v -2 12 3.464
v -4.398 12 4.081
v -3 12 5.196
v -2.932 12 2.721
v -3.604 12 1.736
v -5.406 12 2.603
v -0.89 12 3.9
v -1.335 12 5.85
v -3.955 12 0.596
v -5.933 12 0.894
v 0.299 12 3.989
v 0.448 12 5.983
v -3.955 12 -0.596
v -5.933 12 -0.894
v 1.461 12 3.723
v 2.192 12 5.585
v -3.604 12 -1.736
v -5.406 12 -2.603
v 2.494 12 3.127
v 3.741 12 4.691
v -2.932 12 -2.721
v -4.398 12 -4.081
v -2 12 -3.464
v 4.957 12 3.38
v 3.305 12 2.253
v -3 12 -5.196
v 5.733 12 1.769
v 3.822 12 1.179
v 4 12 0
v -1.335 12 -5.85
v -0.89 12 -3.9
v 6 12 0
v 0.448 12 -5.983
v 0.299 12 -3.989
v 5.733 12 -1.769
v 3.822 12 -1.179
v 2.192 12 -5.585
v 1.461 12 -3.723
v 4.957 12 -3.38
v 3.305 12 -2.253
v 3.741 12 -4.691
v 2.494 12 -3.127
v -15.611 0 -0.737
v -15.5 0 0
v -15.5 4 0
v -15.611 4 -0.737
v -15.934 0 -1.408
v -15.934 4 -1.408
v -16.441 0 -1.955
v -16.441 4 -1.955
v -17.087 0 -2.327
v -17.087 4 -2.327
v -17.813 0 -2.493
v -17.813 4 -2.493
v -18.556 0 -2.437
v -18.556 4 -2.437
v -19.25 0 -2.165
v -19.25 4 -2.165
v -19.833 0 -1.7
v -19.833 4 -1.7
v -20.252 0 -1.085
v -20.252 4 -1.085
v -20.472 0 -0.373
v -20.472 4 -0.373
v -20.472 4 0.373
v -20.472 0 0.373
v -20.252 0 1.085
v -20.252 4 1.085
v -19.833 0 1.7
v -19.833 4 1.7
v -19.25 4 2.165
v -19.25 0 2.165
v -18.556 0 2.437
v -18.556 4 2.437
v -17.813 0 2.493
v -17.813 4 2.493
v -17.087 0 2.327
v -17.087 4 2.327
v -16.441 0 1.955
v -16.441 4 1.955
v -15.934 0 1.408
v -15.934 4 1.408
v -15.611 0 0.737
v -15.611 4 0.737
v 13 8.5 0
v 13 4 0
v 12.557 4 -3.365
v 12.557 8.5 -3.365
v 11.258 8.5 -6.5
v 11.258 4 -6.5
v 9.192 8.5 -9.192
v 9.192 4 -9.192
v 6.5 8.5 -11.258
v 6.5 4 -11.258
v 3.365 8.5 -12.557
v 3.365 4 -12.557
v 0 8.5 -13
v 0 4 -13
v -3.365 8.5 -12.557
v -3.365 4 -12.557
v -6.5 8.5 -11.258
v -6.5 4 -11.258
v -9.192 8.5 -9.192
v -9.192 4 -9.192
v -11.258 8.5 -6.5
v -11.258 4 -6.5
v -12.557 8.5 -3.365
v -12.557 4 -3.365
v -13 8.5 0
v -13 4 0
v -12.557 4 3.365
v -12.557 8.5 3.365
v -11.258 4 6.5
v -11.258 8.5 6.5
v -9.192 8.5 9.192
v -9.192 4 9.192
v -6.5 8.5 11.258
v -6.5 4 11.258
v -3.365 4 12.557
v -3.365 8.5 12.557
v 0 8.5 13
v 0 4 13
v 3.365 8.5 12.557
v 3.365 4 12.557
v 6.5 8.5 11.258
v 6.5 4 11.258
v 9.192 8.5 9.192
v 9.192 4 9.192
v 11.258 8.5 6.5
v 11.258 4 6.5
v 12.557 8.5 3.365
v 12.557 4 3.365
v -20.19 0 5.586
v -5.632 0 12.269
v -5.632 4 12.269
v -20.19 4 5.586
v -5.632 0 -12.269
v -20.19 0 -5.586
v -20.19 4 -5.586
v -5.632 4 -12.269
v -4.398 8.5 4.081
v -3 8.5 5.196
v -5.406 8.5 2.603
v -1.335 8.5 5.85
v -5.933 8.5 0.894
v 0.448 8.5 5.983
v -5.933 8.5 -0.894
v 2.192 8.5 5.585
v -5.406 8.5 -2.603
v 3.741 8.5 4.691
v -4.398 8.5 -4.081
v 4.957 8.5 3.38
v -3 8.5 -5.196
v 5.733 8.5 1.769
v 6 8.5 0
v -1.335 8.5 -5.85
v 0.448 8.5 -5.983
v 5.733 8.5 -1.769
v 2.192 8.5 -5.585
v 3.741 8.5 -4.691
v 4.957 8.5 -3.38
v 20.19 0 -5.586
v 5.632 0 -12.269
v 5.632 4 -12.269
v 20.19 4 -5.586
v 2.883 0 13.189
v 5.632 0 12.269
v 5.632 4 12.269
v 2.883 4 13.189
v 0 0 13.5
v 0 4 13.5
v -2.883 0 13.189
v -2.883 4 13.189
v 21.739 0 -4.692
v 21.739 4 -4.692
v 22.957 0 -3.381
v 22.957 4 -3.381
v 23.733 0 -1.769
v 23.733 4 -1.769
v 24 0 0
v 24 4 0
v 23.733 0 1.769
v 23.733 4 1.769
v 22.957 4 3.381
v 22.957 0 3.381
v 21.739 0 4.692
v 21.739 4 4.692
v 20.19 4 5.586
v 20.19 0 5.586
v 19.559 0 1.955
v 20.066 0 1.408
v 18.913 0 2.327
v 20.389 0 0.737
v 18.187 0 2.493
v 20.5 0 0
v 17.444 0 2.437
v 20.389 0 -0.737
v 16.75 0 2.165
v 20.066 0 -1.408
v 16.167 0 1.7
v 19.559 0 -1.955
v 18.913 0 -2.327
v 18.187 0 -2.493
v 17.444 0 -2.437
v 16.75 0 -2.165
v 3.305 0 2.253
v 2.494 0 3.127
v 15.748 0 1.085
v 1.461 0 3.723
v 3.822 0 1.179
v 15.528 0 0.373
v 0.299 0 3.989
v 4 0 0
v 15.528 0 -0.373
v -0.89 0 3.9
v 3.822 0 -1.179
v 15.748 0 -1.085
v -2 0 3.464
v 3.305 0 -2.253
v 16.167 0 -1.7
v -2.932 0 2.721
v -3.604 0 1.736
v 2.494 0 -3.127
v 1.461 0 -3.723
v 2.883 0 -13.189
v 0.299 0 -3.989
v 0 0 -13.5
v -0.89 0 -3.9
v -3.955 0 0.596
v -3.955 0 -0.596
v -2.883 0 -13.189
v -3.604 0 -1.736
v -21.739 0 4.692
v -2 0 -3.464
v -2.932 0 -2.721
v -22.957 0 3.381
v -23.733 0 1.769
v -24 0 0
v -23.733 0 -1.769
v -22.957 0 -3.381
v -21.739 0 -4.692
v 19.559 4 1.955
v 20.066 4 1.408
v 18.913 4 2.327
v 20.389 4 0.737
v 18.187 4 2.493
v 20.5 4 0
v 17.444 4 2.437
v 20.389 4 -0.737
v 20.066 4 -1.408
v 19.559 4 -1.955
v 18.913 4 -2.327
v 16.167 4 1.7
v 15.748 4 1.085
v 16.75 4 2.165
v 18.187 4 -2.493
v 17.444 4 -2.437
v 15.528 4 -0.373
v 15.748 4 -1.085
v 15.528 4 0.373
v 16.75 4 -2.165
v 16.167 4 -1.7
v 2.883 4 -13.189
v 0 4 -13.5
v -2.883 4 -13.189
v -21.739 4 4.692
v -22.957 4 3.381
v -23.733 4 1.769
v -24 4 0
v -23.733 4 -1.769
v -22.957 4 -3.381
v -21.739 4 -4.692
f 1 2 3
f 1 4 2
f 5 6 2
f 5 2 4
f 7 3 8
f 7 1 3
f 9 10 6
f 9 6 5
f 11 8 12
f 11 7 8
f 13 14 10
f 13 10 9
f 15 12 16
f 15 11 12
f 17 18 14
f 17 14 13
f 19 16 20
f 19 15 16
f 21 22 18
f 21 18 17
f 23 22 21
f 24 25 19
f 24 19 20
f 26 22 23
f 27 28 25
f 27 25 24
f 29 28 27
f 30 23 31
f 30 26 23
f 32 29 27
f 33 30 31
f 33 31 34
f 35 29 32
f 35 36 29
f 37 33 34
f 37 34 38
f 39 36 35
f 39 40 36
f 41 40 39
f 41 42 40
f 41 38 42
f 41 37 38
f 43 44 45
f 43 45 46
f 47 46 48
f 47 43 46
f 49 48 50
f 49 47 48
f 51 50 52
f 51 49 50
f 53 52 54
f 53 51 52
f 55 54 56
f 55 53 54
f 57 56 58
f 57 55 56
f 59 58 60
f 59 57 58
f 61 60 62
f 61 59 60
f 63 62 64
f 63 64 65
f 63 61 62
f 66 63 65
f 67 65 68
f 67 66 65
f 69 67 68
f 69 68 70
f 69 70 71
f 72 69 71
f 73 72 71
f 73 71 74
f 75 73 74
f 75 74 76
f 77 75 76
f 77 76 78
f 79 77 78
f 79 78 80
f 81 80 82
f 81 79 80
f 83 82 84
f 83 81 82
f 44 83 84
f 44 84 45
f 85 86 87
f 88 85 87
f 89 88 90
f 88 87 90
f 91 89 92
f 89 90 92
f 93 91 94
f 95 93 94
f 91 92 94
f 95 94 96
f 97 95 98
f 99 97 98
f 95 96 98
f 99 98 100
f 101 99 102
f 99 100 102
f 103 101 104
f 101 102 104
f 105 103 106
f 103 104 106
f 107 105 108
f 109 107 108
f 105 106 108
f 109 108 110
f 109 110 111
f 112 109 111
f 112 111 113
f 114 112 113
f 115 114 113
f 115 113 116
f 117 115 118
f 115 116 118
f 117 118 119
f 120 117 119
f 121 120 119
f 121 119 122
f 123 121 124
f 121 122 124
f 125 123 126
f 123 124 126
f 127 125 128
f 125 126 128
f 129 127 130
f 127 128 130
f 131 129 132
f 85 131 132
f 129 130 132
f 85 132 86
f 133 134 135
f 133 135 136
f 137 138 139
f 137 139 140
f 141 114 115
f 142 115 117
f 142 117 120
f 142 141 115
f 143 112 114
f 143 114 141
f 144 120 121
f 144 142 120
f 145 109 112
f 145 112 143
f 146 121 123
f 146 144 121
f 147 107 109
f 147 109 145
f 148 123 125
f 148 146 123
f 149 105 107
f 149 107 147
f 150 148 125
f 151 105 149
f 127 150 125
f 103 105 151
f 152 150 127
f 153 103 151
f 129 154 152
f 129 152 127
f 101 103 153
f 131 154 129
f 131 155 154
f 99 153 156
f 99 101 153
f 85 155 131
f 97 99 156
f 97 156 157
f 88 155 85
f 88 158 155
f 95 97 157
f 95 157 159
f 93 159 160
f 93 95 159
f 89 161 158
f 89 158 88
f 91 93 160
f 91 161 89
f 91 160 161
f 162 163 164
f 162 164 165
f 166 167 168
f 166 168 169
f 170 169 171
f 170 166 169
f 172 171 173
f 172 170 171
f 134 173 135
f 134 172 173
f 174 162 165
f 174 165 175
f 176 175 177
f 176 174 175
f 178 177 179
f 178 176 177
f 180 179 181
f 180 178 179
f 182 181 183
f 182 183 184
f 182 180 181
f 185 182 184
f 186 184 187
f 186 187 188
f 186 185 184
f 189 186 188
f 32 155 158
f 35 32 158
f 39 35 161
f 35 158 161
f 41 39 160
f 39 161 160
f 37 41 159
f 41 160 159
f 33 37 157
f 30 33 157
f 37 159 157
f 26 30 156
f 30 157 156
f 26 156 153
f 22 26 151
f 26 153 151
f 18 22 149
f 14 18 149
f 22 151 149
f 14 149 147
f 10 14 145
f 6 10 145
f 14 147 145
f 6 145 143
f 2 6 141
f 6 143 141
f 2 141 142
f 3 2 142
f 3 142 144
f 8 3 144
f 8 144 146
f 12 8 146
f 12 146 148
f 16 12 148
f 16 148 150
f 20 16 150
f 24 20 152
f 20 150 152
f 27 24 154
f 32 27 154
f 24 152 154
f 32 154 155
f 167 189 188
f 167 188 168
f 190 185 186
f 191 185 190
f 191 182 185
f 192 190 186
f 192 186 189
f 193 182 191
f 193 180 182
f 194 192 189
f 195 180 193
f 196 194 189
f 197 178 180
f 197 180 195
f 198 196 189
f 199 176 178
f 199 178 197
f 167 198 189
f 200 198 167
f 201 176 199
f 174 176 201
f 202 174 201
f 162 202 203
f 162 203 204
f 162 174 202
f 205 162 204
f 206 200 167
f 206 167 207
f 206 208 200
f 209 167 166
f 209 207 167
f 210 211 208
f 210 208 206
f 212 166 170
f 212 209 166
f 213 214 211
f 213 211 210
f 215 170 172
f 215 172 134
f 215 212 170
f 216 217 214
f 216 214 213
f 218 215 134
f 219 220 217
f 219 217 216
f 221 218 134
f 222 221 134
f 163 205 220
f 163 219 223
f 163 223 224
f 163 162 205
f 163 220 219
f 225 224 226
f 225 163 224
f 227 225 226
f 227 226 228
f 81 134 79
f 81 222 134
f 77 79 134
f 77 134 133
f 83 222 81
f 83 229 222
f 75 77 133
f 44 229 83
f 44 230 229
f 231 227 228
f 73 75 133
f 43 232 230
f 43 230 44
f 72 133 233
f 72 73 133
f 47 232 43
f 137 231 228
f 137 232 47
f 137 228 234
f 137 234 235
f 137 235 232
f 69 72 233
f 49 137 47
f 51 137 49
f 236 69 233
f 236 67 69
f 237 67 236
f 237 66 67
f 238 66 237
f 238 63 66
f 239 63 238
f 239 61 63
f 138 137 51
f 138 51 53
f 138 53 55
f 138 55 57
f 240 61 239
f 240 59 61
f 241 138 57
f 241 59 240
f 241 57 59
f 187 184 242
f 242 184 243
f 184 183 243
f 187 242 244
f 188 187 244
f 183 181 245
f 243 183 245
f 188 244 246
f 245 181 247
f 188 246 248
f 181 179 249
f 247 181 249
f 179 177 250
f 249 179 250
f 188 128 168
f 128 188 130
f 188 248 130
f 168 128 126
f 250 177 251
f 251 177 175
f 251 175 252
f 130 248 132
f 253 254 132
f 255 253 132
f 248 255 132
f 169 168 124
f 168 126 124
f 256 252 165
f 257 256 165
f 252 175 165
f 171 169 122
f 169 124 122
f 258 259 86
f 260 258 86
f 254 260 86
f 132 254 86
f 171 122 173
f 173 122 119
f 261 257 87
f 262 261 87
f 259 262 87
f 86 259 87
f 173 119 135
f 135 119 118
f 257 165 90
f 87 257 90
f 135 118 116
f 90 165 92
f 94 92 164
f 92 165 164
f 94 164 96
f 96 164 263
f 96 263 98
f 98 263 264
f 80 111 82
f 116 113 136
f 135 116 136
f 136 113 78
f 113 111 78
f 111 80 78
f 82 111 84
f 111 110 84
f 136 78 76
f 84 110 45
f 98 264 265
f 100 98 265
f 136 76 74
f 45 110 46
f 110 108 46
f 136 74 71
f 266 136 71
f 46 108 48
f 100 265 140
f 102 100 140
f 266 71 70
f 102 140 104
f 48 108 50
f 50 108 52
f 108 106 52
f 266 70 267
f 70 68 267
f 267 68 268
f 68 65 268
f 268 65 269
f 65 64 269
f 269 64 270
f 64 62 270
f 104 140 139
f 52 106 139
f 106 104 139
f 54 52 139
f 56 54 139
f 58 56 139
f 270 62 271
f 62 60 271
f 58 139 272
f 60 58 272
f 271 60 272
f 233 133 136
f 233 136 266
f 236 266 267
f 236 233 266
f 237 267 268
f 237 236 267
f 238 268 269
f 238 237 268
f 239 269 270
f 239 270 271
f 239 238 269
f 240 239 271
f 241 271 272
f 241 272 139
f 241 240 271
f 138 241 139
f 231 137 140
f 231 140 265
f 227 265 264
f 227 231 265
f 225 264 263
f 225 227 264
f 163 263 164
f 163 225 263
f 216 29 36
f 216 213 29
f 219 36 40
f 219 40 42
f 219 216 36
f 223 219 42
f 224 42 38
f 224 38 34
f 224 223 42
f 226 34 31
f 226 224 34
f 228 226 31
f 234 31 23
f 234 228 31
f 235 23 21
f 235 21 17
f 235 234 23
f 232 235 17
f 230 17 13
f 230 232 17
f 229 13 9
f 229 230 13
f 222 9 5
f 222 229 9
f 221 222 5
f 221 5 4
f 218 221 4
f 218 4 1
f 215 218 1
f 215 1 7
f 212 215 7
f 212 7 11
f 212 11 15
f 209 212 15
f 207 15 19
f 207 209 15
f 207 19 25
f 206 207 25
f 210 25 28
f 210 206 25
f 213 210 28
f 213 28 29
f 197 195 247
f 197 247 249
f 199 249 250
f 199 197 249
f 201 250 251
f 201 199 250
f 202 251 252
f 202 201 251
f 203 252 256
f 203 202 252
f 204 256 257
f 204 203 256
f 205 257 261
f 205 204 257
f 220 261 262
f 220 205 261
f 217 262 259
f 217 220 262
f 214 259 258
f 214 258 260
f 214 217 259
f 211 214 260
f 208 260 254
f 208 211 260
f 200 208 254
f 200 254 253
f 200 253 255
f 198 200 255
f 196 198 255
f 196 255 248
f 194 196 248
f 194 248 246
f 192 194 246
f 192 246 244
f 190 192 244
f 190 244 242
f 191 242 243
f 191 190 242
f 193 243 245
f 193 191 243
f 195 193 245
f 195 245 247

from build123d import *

# Parameters (mm, degrees)
SKETCH1_R           = 2.5
SKETCH1_R_2         = 4
BOSS_EXTRUDE1_DEPTH = 4
SKETCH2_R           = 13
SKETCH2_R_2         = 4
BOSS_EXTRUDE2_DEPTH = 4.5
SKETCH3_R           = 6
SKETCH3_R_2         = 4
BOSS_EXTRUDE3_DEPTH = 3.5


with BuildPart() as part:
    # Sketch1 → Boss-Extrude1 (new body)
    with BuildSketch(Plane(origin=(0, 0, 0), x_dir=(1, 0, 0), z_dir=(0, 1, 0))):
        with BuildLine():
            Line((-20.189639751, 5.586186334), (-5.632256707, 12.268972426))
            ThreePointArc((-5.632256707, 12.268972426), (0, 13.5), (5.632256707, 12.268972426))
            Line((5.632256707, 12.268972426), (20.189639751, 5.586186334))
            ThreePointArc((20.189639751, 5.586186334), (24, 0), (20.189639751, -5.586186334))
            Line((20.189639751, -5.586186334), (5.632256707, -12.268972426))
            ThreePointArc((5.632256707, -12.268972426), (0, -13.5), (-5.632256707, -12.268972426))
            Line((-5.632256707, -12.268972426), (-20.189639751, -5.586186334))
            ThreePointArc((-20.189639751, -5.586186334), (-24, 0), (-20.189639751, 5.586186334))
        make_face()
        with Locations((18, 0)):
            Circle(SKETCH1_R, mode=Mode.SUBTRACT)
        with Locations((-18, 0)):
            Circle(SKETCH1_R, mode=Mode.SUBTRACT)
        Circle(SKETCH1_R_2, mode=Mode.SUBTRACT)
    extrude(amount=BOSS_EXTRUDE1_DEPTH)

    # Sketch2 → Boss-Extrude2 (add)
    with BuildSketch(Plane(origin=(0, 4, 0), x_dir=(1, 0, 0), z_dir=(0, 1, 0))):
        Circle(SKETCH2_R)
        Circle(SKETCH2_R_2, mode=Mode.SUBTRACT)
    extrude(amount=BOSS_EXTRUDE2_DEPTH)

    # Sketch3 → Boss-Extrude3 (add)
    with BuildSketch(Plane(origin=(0, 8.5, 0), x_dir=(1, 0, 0), z_dir=(0, 1, 0))):
        Circle(SKETCH3_R)
        Circle(SKETCH3_R_2, mode=Mode.SUBTRACT)
    extrude(amount=BOSS_EXTRUDE3_DEPTH)


solid = part.part
